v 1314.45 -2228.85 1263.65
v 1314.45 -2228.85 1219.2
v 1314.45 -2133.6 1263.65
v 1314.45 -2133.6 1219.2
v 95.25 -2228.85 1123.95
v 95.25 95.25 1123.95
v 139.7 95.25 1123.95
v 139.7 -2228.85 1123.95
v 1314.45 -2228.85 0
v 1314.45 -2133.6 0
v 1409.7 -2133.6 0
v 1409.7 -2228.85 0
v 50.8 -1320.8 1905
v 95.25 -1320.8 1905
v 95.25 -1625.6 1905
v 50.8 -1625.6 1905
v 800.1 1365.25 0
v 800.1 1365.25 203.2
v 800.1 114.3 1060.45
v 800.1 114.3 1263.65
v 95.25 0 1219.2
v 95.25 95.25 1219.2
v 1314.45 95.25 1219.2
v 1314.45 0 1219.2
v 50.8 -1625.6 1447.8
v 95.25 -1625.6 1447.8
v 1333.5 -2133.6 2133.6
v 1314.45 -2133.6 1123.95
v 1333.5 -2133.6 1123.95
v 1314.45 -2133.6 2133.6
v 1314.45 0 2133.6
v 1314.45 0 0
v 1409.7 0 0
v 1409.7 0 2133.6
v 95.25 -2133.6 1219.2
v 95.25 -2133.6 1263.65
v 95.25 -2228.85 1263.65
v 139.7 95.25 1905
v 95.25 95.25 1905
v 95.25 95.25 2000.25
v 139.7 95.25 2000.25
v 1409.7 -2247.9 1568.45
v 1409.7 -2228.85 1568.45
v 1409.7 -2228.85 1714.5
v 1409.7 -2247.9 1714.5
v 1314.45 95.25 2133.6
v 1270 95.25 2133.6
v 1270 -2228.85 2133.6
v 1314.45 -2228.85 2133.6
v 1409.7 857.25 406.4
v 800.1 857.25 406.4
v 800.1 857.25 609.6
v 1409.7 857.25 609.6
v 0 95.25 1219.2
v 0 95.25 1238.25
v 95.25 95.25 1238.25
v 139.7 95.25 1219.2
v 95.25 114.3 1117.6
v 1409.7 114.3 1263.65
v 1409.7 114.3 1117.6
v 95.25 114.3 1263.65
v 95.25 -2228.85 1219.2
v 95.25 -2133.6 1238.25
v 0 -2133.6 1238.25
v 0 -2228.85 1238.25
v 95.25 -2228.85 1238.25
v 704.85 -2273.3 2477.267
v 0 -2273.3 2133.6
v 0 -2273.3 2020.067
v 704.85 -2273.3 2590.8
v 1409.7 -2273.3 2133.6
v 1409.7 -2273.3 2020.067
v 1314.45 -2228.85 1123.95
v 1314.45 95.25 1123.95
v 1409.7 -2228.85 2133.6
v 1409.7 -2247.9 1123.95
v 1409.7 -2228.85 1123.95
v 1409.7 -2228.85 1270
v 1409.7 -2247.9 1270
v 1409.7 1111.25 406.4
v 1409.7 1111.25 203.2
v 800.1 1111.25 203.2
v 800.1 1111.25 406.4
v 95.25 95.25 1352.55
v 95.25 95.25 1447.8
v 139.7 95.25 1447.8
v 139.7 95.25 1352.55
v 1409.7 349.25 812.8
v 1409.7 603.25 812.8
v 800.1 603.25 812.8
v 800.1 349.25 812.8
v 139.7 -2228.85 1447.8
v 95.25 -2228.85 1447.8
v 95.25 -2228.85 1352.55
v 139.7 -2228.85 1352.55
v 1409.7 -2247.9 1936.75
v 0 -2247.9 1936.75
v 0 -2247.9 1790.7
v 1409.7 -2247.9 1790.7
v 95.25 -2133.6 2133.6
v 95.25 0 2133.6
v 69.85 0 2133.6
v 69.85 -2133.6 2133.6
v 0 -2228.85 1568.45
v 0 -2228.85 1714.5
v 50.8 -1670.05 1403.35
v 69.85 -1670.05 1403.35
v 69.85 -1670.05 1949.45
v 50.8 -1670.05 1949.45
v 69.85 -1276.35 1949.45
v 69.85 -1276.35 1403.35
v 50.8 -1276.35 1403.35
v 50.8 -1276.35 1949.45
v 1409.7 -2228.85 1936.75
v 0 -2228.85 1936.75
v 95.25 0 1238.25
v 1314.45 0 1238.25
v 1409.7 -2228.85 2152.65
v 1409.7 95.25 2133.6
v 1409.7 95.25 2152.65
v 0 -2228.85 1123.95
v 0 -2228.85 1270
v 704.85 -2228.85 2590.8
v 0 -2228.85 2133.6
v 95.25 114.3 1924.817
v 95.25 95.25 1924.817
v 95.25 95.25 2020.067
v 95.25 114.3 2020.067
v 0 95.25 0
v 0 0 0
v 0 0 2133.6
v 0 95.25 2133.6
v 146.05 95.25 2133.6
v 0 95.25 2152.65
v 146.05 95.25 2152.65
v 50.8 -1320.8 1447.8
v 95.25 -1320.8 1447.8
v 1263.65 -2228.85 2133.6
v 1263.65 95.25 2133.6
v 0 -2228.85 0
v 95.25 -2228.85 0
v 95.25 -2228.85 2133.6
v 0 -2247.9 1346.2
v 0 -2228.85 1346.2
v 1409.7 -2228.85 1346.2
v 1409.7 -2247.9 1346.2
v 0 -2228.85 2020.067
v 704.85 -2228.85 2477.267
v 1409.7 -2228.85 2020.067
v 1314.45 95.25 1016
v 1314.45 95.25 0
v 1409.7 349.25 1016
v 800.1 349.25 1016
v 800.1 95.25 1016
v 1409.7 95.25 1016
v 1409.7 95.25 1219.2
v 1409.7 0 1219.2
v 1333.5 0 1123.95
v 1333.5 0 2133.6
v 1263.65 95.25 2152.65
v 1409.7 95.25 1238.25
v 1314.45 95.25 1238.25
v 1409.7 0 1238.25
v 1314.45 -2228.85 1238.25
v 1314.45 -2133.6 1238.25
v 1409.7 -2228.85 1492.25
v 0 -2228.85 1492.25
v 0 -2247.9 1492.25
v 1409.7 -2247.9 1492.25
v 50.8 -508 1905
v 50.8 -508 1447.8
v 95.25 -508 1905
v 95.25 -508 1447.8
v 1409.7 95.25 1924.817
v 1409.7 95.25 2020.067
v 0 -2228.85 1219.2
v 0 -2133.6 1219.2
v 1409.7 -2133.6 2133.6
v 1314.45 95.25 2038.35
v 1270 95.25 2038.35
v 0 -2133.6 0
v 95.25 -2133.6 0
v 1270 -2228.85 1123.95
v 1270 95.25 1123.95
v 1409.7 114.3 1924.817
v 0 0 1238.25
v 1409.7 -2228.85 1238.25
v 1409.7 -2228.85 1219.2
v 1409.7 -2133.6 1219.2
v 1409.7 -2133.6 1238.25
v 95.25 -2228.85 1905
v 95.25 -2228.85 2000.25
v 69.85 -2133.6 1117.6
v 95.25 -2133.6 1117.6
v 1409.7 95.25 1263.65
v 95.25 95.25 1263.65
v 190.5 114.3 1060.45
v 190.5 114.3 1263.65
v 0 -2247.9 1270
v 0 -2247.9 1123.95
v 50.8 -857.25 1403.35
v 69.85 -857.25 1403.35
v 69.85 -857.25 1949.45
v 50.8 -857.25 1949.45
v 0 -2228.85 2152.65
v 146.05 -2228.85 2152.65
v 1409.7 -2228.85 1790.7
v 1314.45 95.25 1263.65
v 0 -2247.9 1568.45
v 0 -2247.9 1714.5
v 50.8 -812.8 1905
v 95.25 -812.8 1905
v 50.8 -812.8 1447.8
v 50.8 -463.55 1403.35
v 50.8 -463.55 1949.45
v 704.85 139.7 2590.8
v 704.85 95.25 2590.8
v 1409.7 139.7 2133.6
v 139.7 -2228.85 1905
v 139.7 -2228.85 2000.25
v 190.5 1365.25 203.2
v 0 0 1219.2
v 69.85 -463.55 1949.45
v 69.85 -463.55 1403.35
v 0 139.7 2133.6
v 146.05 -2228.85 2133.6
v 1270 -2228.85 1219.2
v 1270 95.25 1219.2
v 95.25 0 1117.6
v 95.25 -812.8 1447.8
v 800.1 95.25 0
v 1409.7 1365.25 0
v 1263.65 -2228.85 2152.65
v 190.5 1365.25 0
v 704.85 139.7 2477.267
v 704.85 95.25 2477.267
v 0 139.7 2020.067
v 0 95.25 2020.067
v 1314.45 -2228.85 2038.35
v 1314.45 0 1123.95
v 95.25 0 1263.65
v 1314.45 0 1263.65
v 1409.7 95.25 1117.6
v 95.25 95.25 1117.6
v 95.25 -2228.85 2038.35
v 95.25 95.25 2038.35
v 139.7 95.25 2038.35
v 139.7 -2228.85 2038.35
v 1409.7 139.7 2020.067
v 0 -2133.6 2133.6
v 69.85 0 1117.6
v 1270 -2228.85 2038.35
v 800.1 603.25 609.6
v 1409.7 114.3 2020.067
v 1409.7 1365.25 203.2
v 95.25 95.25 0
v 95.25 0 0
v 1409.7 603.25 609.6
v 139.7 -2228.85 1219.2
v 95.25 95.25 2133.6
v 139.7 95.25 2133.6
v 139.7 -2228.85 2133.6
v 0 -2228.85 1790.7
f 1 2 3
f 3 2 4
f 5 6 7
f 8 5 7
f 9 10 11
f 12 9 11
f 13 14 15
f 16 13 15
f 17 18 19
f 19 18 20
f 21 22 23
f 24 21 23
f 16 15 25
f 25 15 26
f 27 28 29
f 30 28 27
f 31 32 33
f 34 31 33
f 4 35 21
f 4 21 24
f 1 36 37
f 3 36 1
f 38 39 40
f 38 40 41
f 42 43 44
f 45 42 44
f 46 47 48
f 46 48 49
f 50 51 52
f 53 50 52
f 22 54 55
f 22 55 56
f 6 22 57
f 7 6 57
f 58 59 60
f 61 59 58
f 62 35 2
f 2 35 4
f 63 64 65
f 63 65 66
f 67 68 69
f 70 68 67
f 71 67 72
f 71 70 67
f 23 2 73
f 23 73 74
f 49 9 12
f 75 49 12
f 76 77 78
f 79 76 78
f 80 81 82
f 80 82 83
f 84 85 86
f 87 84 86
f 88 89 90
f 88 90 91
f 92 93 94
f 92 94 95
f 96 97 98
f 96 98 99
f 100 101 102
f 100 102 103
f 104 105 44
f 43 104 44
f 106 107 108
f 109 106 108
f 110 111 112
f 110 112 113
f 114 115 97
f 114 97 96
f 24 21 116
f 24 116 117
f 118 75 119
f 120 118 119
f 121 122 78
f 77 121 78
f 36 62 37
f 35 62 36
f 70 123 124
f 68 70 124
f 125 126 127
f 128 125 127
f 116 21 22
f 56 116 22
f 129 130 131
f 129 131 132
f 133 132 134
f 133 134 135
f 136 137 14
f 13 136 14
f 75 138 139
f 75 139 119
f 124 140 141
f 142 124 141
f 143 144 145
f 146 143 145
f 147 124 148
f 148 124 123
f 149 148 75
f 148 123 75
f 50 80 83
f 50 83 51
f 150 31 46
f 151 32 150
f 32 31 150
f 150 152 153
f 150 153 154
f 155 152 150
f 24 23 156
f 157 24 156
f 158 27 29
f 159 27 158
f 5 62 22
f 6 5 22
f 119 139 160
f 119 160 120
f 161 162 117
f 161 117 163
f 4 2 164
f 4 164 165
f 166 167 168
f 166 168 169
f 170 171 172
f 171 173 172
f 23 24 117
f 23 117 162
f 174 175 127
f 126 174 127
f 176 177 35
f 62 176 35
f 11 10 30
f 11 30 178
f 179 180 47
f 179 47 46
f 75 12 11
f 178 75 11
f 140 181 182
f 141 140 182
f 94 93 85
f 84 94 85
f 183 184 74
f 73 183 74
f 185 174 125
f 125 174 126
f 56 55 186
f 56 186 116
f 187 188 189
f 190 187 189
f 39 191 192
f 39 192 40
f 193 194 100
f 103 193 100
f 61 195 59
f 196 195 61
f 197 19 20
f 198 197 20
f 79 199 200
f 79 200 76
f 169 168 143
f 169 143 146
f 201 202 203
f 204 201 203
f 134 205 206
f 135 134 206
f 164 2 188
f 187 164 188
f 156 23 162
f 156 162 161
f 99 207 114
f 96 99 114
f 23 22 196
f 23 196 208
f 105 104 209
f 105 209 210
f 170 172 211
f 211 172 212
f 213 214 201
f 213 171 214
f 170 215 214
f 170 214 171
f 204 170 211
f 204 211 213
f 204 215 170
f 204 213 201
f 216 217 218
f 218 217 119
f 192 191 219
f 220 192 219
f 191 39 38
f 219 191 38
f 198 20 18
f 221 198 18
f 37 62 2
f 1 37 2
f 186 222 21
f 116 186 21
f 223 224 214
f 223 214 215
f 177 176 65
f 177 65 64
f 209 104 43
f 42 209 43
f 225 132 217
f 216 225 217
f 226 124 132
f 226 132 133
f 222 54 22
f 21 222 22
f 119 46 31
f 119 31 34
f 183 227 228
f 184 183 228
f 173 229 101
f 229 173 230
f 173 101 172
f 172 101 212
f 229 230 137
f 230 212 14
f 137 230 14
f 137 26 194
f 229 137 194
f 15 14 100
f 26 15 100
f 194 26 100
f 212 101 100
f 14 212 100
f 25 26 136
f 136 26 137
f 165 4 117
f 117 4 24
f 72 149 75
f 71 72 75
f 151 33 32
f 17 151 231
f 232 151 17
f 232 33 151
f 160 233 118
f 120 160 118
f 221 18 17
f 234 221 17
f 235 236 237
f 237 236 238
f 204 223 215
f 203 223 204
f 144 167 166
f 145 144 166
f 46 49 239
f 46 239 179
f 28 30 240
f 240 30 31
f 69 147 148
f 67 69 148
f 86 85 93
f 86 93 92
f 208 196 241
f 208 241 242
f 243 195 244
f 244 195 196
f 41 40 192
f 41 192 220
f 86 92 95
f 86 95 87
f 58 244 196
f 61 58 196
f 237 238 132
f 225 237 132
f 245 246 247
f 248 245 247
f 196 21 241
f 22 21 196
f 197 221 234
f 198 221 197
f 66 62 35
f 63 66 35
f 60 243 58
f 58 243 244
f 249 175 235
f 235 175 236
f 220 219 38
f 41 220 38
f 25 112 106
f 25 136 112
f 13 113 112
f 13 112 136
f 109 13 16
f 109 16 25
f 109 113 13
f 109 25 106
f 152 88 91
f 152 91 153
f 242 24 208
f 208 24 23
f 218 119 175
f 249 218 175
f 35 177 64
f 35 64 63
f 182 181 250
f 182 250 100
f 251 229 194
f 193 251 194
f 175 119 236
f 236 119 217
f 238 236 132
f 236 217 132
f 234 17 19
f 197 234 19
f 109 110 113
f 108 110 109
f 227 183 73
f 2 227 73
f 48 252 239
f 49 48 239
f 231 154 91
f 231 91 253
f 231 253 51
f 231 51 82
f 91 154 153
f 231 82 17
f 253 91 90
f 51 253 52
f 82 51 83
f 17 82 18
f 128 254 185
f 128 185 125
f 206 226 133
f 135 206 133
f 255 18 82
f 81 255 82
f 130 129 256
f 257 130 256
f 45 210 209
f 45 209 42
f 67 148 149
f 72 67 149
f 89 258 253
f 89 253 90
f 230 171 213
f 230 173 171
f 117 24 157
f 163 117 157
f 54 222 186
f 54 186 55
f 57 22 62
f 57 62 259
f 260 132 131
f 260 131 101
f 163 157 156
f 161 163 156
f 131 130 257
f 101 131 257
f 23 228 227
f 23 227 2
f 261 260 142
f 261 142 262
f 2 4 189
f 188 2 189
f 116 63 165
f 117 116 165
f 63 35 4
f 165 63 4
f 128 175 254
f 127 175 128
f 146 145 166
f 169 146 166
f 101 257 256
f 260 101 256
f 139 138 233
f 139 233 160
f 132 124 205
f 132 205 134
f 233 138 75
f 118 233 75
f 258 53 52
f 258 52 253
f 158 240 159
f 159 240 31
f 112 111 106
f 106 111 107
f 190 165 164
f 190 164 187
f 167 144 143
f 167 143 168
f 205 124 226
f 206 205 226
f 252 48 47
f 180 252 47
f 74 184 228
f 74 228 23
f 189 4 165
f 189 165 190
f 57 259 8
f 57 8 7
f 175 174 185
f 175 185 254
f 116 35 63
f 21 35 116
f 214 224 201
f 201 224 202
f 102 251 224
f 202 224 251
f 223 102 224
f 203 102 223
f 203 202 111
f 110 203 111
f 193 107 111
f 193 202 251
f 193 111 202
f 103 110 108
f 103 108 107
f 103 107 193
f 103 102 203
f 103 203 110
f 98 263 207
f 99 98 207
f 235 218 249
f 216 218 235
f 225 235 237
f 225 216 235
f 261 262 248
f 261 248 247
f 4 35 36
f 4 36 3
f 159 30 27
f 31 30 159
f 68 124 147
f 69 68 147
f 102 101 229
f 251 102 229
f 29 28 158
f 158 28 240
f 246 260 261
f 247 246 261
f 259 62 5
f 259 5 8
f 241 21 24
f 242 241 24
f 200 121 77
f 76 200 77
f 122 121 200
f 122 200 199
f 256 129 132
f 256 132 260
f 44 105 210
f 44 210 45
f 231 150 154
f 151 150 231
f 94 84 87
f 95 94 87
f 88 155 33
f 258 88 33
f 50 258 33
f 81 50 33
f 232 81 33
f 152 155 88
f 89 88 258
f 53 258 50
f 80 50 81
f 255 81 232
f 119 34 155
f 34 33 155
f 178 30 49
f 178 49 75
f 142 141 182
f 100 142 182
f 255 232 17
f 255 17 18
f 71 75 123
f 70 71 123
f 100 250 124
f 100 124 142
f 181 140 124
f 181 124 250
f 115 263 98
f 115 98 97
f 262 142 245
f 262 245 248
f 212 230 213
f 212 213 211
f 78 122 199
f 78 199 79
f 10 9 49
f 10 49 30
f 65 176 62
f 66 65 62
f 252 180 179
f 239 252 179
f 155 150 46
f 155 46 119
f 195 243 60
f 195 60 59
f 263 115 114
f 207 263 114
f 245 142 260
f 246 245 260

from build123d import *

# Parameters (mm, degrees)
F0_W      = 95.25
F0_H      = 95.25
F1_DEPTH  = 2133.6
F3_W      = 95.25
F3_H      = 95.25
F4_DEPTH  = 19.05
F3_W_2    = 1219.2
F3_H_2    = 2133.6
F5_W      = 44.45
F5_H      = 2324.1
F6_DEPTH  = 95.25
F8_W      = 44.45
F8_H      = 2324.1
F9_DEPTH  = 95.25
F11_W     = 44.45
F11_H     = 2324.1
F12_DEPTH = 95.25
F13_W     = 2133.6
F13_H     = 133.35
F14_DEPTH = 25.4
F15_W     = 1219.2
F15_H     = 95.25
F16_DEPTH = 44.45
F17_W     = 44.45
F17_H     = 2324.1
F18_DEPTH = 95.25
F20_DEPTH = 44.45
F22_DEPTH = 44.45
F23_W     = 1409.7
F23_H     = 146.05
F24_DEPTH = 19.05
F25_W     = 2133.6
F25_H     = 1009.65
F26_DEPTH = 19.05
F27_W     = 1314.45
F27_H     = 95.25
F28_DEPTH = 19.05
F27_H_2   = 146.05
F29_W     = 146.05
F29_H     = 2324.1
F30_DEPTH = 19.05
F32_DEPTH = 609.6
F34_DEPTH = 609.6
F35_W     = 393.7
F35_H     = 546.1
F35_W_2   = 304.8
F35_H_2   = 457.2
F36_DEPTH = 19.05


with BuildPart() as f1:
    # F0 (on Top) → F1 (new body)
    with BuildSketch(Plane.XY):
        with Locations((47.625, 47.625)):
            Rectangle(F0_W, F0_H)
    extrude(amount=F1_DEPTH)


with BuildPart() as f1b:
    # F0 (on Top) → F1, piece 2 (new body)
    with BuildSketch(Plane.XY):
        with Locations((1362.075, 47.625)):
            Rectangle(F0_W, F0_H)
    extrude(amount=F1_DEPTH)

    # F31 (on face) → F32 (join)
    with BuildSketch(Plane.YZ.offset(1409.7)):
        Polygon((349.25, 1016), (95.25, 1016), (95.25, 0), (1365.25, 0), (1365.25, 203.2), (1111.25, 203.2), (1111.25, 406.4), (857.25, 406.4), (857.25, 609.6), (603.25, 609.6), (603.25, 812.8), (349.25, 812.8), align=None)
    extrude(amount=-F32_DEPTH)


with BuildPart() as f1c:
    # F0 (on Top) → F1, piece 3 (new body)
    with BuildSketch(Plane.XY):
        with Locations((1362.075, -2181.225)):
            Rectangle(F0_W, F0_H)
    extrude(amount=F1_DEPTH)


with BuildPart() as f1d:
    # F0 (on Top) → F1, piece 4 (new body)
    with BuildSketch(Plane.XY):
        with Locations((47.625, -2181.225)):
            Rectangle(F0_W, F0_H)
    extrude(amount=F1_DEPTH)


with BuildPart() as f4:
    # F3 (on offset) → F4 (new body)
    with BuildSketch(Plane.XY.offset(1219.2)):
        with Locations((47.625, -2181.225)):
            Rectangle(F3_W, F3_H)
    extrude(amount=F4_DEPTH)


with BuildPart() as f4b:
    # F3 (on offset) → F4, piece 2 (new body)
    with BuildSketch(Plane.XY.offset(1219.2)):
        with Locations((47.625, 47.625)):
            Rectangle(F3_W, F3_H)
    extrude(amount=F4_DEPTH)


with BuildPart() as f4c:
    # F3 (on offset) → F4, piece 3 (new body)
    with BuildSketch(Plane.XY.offset(1219.2)):
        with Locations((1362.075, 47.625)):
            Rectangle(F3_W, F3_H)
    extrude(amount=F4_DEPTH)


with BuildPart() as f4d:
    # F3 (on offset) → F4, piece 4 (new body)
    with BuildSketch(Plane.XY.offset(1219.2)):
        with Locations((1362.075, -2181.225)):
            Rectangle(F3_W, F3_H)
    extrude(amount=F4_DEPTH)


with BuildPart() as f4e:
    # F3 (on offset) → F4, piece 5 (new body)
    with BuildSketch(Plane.XY.offset(1219.2)):
        with Locations((704.85, -1066.8)):
            Rectangle(F3_W_2, F3_H_2)
    extrude(amount=F4_DEPTH)


with BuildPart() as f6:
    # F5 (on offset) → F6 (new body)
    with BuildSketch(Plane.XY.offset(1219.2)):
        with Locations((117.475, -1066.8)):
            Rectangle(F5_W, F5_H)
    extrude(amount=-F6_DEPTH)


with BuildPart() as f6b:
    # F5 (on offset) → F6, piece 2 (new body)
    with BuildSketch(Plane.XY.offset(1219.2)):
        with Locations((1292.225, -1066.8)):
            Rectangle(F5_W, F5_H)
    extrude(amount=-F6_DEPTH)


with BuildPart() as f9:
    # F8 (on offset) → F9 (new body)
    with BuildSketch(Plane.XY.offset(1447.8)):
        with Locations((117.475, -1066.8)):
            Rectangle(F8_W, F8_H)
    extrude(amount=-F9_DEPTH)


with BuildPart() as f12:
    # F11 (on offset) → F12 (new body)
    with BuildSketch(Plane.XY.offset(1905)):
        with Locations((117.475, -1066.8)):
            Rectangle(F11_W, F11_H)
    extrude(amount=F12_DEPTH)


with BuildPart() as f14:
    # F13 (on face) → F14 (new body)
    with BuildSketch(Plane(origin=(95.25, 0, 0), x_dir=(0, -1, 0), z_dir=(-1, 0, 0))):
        with Locations((1066.8, 2066.925)):
            Rectangle(F13_W, F13_H)
        Polygon((2133.6, 2000.25), (0, 2000.25), (0, 1905), (508, 1905), (812.8, 1905), (1320.8, 1905), (1625.6, 1905), (2133.6, 1905), align=None)
        Polygon((508, 1905), (0, 1905), (0, 1117.6), (2133.6, 1117.6), (2133.6, 1905), (1625.6, 1905), (1625.6, 1447.8), (1320.8, 1447.8), (1320.8, 1905), (812.8, 1905), (812.8, 1447.8), (508, 1447.8), align=None)
    extrude(amount=F14_DEPTH)

    # F35 (on face) → F36 (join)
    with BuildSketch(Plane(origin=(69.85, 0, 0), x_dir=(0, -1, 0), z_dir=(-1, 0, 0))):
        with Locations((660.4, 1676.4)):
            Rectangle(F35_W, F35_H)
        with Locations((660.4, 1676.4)):
            Rectangle(F35_W_2, F35_H_2, mode=Mode.SUBTRACT)
        with Locations((1473.2, 1676.4)):
            Rectangle(F35_W, F35_H)
        with Locations((1473.2, 1676.4)):
            Rectangle(F35_W_2, F35_H_2, mode=Mode.SUBTRACT)
    extrude(amount=F36_DEPTH)


with BuildPart() as f16:
    # F15 (on offset) → F16 (new body)
    with BuildSketch(Plane.XY.offset(1219.2)):
        with Locations((704.85, 47.625)):
            Rectangle(F15_W, F15_H)
    extrude(amount=F16_DEPTH)


with BuildPart() as f16b:
    # F15 (on offset) → F16, piece 2 (new body)
    with BuildSketch(Plane.XY.offset(1219.2)):
        with Locations((704.85, -2181.225)):
            Rectangle(F15_W, F15_H)
    extrude(amount=F16_DEPTH)


with BuildPart() as f18:
    # F17 (on face) → F18 (new body)
    with BuildSketch(Plane.XY.offset(2133.6)):
        with Locations((117.475, -1066.8)):
            Rectangle(F17_W, F17_H)
    extrude(amount=-F18_DEPTH)


with BuildPart() as f18b:
    # F17 (on face) → F18, piece 2 (new body)
    with BuildSketch(Plane.XY.offset(2133.6)):
        with Locations((1292.225, -1066.8)):
            Rectangle(F17_W, F17_H)
    extrude(amount=-F18_DEPTH)


with BuildPart() as f20:
    # F19 (on face) → F20 (new body)
    with BuildSketch(Plane.XZ.offset(2228.85)):
        Polygon((704.85, 2590.8), (0, 2133.6), (0, 2020.0667518361), (704.85, 2477.2667518361), align=None)
        Polygon((1409.7, 2133.6), (704.85, 2590.8), (704.85, 2477.2667518361), (1409.7, 2020.0667518361), align=None)
    extrude(amount=F20_DEPTH)


with BuildPart() as f22:
    # F21 (on face) → F22 (new body)
    with BuildSketch(Plane(origin=(0, 95.25, 0), x_dir=(-1, 0, 0), z_dir=(0, 1, 0))):
        Polygon((0, 2133.6), (-704.85, 2590.8), (-1409.7, 2133.6), (-1409.7, 2020.0667518361), (-704.85, 2477.2667518361), (0, 2020.0667518361), align=None)
    extrude(amount=F22_DEPTH)


with BuildPart() as f24:
    # F23 (on face) → F24 (new body)
    with BuildSketch(Plane.XZ.offset(2228.85)):
        with Locations((704.85, 1196.975)):
            Rectangle(F23_W, F23_H)
    extrude(amount=F24_DEPTH)


with BuildPart() as f24b:
    # F23 (on face) → F24, piece 2 (new body)
    with BuildSketch(Plane.XZ.offset(2228.85)):
        with Locations((704.85, 1419.225)):
            Rectangle(F23_W, F23_H)
    extrude(amount=F24_DEPTH)


with BuildPart() as f24c:
    # F23 (on face) → F24, piece 3 (new body)
    with BuildSketch(Plane.XZ.offset(2228.85)):
        with Locations((704.85, 1641.475)):
            Rectangle(F23_W, F23_H)
    extrude(amount=F24_DEPTH)


with BuildPart() as f24d:
    # F23 (on face) → F24, piece 4 (new body)
    with BuildSketch(Plane.XZ.offset(2228.85)):
        with Locations((704.85, 1863.725)):
            Rectangle(F23_W, F23_H)
    extrude(amount=F24_DEPTH)


with BuildPart() as f26:
    # F25 (on face) → F26 (new body)
    with BuildSketch(Plane.YZ.offset(1314.45)):
        with Locations((-1066.8, 1628.775)):
            Rectangle(F25_W, F25_H)
    extrude(amount=F26_DEPTH)


with BuildPart() as f28:
    # F27 (on face) → F28 (new body)
    with BuildSketch(Plane(origin=(0, 95.25, 0), x_dir=(-1, 0, 0), z_dir=(0, 1, 0))):
        with Locations((-752.475, 1972.4417518361)):
            Rectangle(F27_W, F27_H)
    extrude(amount=F28_DEPTH)


with BuildPart() as f28b:
    # F27 (on face) → F28, piece 2 (new body)
    with BuildSketch(Plane(origin=(0, 95.25, 0), x_dir=(-1, 0, 0), z_dir=(0, 1, 0))):
        with Locations((-752.475, 1190.625)):
            Rectangle(F27_W, F27_H_2)
    extrude(amount=F28_DEPTH)


with BuildPart() as f30:
    # F29 (on face) → F30 (new body)
    with BuildSketch(Plane.XY.offset(2133.6)):
        with Locations((1336.675, -1066.8)):
            Rectangle(F29_W, F29_H)
    extrude(amount=F30_DEPTH)


with BuildPart() as f30b:
    # F29 (on face) → F30, piece 2 (new body)
    with BuildSketch(Plane.XY.offset(2133.6)):
        with Locations((73.025, -1066.8)):
            Rectangle(F29_W, F29_H)
    extrude(amount=F30_DEPTH)


with BuildPart() as f34:
    # F33 (on face) → F34 (new body)
    with BuildSketch(Plane(origin=(800.1, 0, 0), x_dir=(0, -1, 0), z_dir=(-1, 0, 0))):
        Polygon((-114.3, 1263.65), (-1365.25, 203.2), (-1365.25, 0), (-114.3, 1060.45), align=None)
    extrude(amount=F34_DEPTH)


solid = Compound([f1.part, f1b.part, f1c.part, f1d.part, f4.part, f4b.part, f4c.part, f4d.part, f4e.part, f6.part, f6b.part, f9.part, f12.part, f14.part, f16.part, f16b.part, f18.part, f18b.part, f20.part, f22.part, f24.part, f24b.part, f24c.part, f24d.part, f26.part, f28.part, f28b.part, f30.part, f30b.part, f34.part])
